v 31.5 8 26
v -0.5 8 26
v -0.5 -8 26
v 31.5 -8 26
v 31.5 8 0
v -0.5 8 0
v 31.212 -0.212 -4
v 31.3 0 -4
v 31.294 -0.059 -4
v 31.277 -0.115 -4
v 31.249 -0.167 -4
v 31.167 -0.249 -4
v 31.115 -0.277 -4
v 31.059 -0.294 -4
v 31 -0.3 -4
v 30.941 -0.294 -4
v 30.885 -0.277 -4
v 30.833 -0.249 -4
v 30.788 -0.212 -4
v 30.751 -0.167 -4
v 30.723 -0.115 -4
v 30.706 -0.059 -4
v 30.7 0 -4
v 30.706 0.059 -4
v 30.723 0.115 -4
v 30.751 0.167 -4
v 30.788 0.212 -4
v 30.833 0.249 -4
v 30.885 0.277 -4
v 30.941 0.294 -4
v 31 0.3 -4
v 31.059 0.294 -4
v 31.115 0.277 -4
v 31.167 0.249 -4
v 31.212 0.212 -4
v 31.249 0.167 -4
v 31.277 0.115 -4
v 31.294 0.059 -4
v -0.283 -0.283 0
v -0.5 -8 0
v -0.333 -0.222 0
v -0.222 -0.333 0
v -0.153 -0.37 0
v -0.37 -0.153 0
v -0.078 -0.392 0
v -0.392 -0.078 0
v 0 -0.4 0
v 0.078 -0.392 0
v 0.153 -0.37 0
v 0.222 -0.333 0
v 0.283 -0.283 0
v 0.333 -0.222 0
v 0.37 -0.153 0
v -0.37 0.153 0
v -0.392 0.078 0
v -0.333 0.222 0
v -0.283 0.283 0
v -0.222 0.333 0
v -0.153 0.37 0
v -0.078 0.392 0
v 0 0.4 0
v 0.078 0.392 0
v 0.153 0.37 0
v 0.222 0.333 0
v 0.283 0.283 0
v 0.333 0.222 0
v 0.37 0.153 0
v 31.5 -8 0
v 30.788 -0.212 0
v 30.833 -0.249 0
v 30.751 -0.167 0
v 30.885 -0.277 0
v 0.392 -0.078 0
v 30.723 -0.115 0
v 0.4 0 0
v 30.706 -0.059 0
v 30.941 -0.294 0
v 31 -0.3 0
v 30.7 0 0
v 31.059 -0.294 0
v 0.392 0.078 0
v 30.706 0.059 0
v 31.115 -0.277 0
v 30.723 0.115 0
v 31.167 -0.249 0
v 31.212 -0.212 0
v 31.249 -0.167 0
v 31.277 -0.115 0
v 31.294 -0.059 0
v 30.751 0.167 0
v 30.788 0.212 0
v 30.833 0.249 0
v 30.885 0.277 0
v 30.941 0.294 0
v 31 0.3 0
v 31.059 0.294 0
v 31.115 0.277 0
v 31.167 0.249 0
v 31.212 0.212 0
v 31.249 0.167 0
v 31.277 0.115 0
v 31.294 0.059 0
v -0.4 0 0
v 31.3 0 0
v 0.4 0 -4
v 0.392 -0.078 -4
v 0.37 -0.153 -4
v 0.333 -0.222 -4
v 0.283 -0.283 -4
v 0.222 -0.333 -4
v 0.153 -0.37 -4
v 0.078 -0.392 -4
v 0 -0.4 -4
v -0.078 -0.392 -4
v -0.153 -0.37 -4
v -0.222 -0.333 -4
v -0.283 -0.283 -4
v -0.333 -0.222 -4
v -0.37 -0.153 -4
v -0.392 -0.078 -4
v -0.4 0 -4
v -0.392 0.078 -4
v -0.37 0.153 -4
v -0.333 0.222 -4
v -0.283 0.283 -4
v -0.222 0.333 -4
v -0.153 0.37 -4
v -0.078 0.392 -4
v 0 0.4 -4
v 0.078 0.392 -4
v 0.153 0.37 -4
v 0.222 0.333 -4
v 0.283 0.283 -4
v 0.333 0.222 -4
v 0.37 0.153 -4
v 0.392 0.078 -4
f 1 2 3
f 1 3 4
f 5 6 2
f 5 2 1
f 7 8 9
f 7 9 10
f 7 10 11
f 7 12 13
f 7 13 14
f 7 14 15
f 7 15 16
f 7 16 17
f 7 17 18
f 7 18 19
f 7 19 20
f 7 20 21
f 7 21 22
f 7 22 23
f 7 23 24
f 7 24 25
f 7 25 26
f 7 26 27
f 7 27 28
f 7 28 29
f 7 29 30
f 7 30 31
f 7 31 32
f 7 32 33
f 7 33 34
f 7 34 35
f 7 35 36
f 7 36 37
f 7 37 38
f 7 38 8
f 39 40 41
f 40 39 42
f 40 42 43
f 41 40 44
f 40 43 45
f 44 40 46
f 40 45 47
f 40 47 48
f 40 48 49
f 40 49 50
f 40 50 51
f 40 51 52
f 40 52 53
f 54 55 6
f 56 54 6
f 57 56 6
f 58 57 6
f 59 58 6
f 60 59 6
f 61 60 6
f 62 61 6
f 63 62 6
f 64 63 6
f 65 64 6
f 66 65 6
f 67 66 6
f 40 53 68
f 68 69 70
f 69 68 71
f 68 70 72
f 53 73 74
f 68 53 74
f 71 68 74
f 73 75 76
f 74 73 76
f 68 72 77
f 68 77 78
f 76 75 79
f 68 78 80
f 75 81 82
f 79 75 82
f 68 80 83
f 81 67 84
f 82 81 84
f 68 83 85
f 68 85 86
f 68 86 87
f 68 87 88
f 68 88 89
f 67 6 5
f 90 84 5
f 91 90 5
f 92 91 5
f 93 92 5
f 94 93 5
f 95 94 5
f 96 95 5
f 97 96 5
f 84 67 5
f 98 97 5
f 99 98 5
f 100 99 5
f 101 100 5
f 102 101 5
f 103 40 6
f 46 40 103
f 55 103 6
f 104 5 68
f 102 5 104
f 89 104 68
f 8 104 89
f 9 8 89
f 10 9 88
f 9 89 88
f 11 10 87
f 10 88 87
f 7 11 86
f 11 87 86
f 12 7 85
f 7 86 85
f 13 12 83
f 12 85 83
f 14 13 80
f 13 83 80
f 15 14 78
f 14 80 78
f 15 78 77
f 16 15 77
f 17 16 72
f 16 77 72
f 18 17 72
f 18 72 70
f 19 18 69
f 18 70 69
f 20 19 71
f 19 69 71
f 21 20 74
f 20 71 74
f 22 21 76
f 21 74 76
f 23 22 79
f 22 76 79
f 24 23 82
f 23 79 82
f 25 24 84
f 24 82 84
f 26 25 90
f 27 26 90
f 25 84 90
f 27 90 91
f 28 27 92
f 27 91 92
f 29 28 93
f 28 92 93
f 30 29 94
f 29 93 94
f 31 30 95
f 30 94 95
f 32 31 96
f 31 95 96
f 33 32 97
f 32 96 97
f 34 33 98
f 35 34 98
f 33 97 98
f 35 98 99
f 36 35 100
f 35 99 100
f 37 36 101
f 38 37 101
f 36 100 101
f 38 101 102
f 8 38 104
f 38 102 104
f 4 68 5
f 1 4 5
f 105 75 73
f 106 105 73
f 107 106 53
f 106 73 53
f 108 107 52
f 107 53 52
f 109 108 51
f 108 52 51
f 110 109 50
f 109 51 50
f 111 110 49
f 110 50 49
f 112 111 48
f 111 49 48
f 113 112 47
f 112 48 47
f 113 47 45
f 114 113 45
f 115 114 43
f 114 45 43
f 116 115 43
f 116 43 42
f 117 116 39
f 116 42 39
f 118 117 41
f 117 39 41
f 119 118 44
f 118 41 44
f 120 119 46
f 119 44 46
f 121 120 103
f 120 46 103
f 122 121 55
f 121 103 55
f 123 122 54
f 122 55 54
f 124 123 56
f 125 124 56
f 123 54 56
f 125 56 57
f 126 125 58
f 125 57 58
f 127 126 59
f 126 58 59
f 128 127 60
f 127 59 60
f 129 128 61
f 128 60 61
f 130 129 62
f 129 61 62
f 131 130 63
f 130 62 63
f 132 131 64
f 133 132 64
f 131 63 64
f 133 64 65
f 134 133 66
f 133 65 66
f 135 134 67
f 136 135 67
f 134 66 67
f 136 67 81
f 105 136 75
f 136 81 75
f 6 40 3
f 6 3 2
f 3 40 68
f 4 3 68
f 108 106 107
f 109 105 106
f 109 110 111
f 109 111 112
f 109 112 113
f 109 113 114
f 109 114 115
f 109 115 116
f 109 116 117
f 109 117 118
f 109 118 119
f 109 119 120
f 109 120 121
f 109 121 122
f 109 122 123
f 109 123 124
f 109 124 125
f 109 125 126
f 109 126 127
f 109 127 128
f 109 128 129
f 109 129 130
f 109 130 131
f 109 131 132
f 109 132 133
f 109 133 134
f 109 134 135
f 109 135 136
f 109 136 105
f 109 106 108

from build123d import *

# Parameters (mm, degrees)
SKETCH_2_W      = 32
SKETCH_2_H      = 16
EXTRUDE_1_DEPTH = 26
SKETCH_3_R      = 0.4
SKETCH_3_R_2    = 0.3
EXTRUDE_2_DEPTH = 4


with BuildPart() as part:
    # Эскиз2 → Вытянуть1 (new body)
    with BuildSketch(Plane.XY):
        with Locations((15.5, 0)):
            Rectangle(SKETCH_2_W, SKETCH_2_H)
    extrude(amount=EXTRUDE_1_DEPTH)

    # Эскиз3 → Вытянуть2 (add)
    with BuildSketch(Plane(origin=(0, 0, 0), x_dir=(-1, 0, 0), z_dir=(0, 0, -1))):
        with Locations(Location((0, 0, 0), (0, 0, 180))):
            Circle(SKETCH_3_R)
        with Locations(Location((-31, 0, 0), (0, 0, 180))):
            Circle(SKETCH_3_R_2)
    extrude(amount=EXTRUDE_2_DEPTH)


solid = part.part
